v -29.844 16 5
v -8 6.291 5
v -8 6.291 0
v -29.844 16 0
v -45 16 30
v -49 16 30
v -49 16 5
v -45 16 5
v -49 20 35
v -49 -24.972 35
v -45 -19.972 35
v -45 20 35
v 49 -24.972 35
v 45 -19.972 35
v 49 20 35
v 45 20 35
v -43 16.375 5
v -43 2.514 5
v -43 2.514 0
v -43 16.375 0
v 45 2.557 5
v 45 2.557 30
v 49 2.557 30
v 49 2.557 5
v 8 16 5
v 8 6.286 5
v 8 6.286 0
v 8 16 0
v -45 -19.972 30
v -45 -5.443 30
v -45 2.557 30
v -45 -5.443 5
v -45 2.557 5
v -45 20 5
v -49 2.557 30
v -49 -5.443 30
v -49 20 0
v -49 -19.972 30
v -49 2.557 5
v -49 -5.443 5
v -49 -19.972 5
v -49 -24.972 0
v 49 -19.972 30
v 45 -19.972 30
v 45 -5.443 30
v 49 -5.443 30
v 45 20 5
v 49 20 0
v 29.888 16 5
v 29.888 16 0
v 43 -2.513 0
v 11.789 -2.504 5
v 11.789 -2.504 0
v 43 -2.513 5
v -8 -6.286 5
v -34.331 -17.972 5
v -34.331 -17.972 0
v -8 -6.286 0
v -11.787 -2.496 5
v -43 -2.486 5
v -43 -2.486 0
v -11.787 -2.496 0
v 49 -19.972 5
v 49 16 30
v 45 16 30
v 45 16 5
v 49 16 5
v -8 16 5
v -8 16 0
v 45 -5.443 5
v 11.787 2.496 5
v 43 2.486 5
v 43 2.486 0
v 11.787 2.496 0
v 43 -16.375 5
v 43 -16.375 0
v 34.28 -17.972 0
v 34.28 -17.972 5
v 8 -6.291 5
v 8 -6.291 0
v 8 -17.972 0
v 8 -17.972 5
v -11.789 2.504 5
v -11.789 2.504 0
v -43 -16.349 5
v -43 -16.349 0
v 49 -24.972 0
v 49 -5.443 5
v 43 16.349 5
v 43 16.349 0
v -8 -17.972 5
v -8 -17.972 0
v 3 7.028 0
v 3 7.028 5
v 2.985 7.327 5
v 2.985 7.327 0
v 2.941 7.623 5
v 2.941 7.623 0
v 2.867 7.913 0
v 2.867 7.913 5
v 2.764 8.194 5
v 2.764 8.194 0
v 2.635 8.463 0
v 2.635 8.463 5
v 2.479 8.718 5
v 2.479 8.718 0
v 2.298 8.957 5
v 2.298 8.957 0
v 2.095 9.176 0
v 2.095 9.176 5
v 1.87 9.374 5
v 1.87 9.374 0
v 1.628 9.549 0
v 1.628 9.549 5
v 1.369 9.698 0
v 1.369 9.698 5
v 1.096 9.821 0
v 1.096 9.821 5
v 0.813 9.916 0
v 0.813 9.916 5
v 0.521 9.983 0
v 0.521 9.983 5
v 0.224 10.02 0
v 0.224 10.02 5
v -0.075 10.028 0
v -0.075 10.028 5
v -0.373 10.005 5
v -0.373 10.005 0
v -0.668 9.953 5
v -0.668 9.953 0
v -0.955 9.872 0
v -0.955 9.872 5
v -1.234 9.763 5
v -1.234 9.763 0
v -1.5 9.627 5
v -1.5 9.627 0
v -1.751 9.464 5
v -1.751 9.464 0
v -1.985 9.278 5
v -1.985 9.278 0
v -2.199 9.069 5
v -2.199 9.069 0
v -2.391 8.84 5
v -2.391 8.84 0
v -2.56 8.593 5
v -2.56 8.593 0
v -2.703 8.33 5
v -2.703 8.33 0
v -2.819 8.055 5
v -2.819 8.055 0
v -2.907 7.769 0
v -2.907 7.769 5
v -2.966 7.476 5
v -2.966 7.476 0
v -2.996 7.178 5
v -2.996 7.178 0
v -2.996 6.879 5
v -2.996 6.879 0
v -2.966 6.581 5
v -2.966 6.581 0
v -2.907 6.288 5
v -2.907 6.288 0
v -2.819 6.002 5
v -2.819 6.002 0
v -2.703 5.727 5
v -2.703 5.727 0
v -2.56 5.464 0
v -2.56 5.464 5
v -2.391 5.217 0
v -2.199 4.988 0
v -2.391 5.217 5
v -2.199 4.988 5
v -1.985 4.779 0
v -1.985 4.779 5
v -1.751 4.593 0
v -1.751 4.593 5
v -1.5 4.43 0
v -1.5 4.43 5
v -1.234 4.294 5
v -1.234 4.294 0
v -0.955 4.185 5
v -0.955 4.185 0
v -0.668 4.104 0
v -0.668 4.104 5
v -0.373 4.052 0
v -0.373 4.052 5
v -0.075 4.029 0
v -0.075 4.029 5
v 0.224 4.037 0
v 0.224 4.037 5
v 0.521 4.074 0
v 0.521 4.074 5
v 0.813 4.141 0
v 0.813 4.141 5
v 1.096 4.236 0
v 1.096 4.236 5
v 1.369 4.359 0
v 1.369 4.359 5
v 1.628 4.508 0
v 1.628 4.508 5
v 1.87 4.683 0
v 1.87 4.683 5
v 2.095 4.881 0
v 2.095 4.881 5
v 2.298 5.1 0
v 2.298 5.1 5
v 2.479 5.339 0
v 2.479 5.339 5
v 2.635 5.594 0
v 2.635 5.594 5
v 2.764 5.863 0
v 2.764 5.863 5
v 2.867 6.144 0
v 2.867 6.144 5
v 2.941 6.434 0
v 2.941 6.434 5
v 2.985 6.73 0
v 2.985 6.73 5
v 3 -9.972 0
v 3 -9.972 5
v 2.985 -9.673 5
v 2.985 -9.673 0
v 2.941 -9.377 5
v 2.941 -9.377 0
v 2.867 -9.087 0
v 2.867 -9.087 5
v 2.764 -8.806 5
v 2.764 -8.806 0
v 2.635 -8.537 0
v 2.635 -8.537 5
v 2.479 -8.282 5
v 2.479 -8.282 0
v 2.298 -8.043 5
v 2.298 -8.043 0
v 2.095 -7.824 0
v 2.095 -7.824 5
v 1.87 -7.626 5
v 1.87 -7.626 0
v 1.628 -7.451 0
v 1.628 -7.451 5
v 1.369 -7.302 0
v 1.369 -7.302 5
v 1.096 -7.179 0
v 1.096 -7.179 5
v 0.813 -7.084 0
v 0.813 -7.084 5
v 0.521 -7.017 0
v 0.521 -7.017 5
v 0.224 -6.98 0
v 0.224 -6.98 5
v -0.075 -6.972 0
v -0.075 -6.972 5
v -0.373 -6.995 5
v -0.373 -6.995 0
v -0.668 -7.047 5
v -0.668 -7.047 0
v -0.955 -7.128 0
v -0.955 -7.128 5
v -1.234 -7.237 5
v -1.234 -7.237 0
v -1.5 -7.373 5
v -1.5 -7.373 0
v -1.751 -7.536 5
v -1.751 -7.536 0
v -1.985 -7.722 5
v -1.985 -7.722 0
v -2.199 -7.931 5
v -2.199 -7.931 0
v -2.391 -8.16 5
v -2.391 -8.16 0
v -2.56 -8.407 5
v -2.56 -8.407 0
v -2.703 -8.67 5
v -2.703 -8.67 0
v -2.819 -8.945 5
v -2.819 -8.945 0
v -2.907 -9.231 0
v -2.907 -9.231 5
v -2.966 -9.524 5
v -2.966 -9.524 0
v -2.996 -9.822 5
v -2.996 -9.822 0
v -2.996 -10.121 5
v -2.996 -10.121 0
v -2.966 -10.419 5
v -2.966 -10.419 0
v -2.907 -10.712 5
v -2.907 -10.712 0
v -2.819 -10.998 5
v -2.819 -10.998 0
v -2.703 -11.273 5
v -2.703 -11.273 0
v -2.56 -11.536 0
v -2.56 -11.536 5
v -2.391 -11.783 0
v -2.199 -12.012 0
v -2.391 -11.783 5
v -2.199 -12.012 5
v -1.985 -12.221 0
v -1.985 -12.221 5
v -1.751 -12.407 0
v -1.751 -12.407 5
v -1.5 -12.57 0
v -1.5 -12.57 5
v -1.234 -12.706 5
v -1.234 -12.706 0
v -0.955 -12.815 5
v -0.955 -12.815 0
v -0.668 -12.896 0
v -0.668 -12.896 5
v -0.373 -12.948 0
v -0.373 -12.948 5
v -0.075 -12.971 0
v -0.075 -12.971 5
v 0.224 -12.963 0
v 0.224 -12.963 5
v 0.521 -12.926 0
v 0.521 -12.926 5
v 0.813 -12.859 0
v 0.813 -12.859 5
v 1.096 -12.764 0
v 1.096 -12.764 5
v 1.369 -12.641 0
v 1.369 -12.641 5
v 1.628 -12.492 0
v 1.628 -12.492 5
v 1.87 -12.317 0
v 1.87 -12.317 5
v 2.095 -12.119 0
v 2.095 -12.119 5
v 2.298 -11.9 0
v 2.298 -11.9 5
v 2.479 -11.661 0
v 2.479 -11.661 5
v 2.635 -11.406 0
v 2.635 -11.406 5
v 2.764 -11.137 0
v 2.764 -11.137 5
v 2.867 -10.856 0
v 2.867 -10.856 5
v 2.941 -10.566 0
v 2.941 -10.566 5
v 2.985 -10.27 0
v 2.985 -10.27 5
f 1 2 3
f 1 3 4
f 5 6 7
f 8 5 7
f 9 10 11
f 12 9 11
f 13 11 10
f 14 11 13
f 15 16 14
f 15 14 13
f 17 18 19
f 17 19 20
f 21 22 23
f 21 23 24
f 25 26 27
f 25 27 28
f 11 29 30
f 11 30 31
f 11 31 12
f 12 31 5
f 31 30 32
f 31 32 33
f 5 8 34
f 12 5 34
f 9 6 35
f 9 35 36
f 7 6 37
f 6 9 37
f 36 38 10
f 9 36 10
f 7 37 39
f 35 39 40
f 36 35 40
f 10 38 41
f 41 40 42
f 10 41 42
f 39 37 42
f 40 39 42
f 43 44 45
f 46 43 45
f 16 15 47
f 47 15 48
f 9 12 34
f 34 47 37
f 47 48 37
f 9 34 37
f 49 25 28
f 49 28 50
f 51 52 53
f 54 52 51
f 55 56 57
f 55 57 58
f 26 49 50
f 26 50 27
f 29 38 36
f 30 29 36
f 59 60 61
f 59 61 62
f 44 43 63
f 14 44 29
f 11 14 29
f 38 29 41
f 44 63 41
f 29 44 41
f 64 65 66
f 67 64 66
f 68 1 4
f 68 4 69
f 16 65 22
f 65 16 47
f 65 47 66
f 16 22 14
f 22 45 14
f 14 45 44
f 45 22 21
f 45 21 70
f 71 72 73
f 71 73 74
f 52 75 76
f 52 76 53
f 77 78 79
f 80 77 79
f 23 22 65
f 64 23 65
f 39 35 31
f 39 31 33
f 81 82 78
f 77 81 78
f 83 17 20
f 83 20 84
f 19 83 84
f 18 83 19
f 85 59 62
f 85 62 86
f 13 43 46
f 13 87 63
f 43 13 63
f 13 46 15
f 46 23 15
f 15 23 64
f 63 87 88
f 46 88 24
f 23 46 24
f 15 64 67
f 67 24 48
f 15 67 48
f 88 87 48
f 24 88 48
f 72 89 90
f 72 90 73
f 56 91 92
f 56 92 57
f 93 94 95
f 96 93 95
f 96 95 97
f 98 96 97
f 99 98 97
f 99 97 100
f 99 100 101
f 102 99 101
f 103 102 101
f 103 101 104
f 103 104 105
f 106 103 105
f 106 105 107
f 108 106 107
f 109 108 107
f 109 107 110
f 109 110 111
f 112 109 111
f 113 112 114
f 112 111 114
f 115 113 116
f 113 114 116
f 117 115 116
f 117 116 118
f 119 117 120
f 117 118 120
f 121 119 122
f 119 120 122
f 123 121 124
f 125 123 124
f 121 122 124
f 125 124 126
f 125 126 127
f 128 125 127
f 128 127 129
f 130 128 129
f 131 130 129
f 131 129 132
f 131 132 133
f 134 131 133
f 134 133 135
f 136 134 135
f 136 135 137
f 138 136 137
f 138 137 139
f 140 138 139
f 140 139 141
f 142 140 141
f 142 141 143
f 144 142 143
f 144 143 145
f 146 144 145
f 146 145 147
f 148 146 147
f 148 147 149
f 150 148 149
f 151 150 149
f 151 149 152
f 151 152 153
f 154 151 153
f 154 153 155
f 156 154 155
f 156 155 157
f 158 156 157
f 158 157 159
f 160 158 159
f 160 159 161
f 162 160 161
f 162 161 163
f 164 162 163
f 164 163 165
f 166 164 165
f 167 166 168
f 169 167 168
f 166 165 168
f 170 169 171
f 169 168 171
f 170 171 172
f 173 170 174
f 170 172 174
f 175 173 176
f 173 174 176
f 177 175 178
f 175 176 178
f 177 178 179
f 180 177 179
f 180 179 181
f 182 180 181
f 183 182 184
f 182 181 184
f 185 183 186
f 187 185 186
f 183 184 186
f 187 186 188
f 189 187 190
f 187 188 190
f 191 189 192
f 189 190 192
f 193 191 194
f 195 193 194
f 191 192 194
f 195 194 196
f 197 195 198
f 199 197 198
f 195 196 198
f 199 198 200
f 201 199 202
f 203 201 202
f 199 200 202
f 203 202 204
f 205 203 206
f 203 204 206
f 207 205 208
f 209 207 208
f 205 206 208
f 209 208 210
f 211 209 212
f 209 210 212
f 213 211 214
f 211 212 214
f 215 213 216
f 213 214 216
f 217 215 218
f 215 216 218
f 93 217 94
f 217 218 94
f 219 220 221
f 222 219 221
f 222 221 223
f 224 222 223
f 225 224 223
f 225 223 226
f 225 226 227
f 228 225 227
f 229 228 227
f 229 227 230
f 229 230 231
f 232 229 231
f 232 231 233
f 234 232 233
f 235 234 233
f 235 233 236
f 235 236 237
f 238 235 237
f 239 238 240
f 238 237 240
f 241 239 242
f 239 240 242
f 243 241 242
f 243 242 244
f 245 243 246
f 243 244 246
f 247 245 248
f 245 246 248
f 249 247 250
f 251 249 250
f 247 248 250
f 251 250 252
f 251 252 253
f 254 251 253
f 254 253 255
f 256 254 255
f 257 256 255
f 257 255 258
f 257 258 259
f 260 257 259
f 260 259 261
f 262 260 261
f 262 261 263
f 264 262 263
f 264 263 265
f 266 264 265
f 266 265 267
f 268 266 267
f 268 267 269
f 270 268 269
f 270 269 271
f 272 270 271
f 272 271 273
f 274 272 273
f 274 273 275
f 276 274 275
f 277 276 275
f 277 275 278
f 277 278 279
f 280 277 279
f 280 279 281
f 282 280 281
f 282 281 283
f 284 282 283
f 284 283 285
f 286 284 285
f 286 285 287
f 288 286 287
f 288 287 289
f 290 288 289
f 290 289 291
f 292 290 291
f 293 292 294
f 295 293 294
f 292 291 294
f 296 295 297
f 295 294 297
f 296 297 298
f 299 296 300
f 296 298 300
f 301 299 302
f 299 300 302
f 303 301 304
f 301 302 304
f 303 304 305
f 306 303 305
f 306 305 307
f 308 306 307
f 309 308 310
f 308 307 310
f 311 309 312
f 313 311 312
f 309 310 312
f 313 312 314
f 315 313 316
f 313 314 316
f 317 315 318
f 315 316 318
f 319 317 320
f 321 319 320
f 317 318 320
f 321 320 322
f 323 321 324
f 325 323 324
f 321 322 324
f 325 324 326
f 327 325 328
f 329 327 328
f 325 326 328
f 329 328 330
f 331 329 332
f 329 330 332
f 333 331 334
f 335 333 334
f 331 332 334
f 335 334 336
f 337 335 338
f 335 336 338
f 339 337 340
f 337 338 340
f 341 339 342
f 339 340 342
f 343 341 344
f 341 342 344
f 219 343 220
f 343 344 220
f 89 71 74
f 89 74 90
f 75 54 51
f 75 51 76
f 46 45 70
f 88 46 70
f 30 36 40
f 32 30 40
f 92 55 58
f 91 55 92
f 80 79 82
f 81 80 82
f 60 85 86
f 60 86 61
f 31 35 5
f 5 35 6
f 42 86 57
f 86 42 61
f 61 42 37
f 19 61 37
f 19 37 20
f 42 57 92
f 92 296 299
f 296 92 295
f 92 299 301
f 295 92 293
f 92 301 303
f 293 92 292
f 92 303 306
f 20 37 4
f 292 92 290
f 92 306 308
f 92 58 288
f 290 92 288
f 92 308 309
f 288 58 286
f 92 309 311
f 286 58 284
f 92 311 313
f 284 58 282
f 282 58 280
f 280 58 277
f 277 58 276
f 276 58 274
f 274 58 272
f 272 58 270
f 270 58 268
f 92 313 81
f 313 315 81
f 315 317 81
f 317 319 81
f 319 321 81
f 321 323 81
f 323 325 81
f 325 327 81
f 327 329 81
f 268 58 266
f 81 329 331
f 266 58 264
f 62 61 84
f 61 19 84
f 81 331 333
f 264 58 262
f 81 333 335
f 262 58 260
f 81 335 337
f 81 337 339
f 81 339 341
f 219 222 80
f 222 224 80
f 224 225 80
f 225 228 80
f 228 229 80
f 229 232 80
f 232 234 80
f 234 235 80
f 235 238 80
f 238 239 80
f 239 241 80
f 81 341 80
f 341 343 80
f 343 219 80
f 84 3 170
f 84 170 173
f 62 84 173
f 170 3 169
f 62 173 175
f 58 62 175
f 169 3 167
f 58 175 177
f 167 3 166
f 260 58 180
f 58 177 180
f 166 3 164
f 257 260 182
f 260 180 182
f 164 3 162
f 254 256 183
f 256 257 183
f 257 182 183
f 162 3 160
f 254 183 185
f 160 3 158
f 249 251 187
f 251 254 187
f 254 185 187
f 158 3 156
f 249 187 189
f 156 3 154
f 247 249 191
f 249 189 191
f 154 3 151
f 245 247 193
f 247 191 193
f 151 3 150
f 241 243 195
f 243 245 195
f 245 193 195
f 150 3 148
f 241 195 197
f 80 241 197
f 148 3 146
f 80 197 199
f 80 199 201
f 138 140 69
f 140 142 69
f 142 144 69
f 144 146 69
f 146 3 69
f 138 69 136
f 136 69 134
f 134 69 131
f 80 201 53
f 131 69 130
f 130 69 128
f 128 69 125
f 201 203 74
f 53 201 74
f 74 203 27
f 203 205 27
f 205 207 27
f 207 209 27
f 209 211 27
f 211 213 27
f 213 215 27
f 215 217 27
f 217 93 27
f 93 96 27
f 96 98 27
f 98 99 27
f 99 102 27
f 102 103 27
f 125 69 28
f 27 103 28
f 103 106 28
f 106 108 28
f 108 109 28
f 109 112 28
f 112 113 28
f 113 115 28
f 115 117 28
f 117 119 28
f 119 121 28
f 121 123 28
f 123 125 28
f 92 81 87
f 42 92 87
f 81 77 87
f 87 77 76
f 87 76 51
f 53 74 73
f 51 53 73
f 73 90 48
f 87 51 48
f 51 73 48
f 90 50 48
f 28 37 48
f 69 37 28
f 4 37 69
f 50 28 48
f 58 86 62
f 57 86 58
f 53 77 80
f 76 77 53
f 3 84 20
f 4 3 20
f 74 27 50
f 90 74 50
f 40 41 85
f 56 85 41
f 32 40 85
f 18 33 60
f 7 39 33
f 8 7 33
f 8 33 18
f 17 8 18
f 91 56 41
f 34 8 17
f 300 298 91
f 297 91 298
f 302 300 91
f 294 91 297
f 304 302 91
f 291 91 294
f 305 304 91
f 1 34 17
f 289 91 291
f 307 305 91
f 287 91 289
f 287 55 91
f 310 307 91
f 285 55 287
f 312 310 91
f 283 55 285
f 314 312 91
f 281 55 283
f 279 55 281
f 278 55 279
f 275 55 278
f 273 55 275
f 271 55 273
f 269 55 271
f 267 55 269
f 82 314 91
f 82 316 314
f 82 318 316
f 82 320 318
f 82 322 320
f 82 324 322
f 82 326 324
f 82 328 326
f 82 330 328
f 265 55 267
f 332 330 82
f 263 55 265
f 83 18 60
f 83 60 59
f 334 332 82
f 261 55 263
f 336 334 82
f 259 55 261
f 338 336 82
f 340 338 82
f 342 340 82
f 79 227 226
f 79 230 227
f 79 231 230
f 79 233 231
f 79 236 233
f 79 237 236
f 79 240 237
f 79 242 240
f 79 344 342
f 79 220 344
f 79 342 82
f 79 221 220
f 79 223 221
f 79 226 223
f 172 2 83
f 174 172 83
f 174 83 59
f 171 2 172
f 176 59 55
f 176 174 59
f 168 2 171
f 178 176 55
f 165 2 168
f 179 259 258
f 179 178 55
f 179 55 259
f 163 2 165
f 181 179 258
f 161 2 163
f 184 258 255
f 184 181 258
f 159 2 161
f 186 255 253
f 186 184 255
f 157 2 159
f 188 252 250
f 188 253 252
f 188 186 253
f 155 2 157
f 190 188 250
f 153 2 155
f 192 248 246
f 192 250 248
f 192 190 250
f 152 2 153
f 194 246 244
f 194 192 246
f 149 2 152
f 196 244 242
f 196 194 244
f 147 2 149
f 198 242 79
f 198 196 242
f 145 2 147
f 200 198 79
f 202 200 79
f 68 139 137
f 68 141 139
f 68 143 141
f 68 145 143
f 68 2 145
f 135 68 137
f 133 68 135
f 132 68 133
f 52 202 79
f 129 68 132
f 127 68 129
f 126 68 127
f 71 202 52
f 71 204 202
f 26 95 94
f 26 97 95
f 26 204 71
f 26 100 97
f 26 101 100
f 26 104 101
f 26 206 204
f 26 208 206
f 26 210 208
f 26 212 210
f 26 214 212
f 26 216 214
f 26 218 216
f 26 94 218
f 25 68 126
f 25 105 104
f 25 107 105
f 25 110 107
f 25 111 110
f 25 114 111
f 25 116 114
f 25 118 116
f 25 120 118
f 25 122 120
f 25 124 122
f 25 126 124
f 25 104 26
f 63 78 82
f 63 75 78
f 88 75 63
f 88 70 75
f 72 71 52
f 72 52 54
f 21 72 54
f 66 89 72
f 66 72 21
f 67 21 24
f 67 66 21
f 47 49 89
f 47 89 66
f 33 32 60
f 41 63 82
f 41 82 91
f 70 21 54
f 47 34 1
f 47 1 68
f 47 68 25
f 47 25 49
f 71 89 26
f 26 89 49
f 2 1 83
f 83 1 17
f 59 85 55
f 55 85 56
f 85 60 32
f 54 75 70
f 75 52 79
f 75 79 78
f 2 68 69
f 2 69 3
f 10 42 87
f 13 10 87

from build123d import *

# Parameters (mm, degrees)
SKETCH1_W               = 90
SKETCH1_H               = 40
BOSS_EXTRUDE1_DEPTH     = 5
BOSS_EXTRUDE2_DEPTH     = 35
SKETCH3_R               = 3
CUT_EXTRUDE1_DEPTH      = 63.646443504
CUT_EXTRUDE2_DEPTH      = 35
CUT_EXTRUDE3_DEPTH      = 108.016713105
CUT_EXTRUDE3_DEPTH_BACK = 108.016713105
SKETCH5_W               = 25
SKETCH5_H               = 13.442792372
SKETCH5_H_2             = 14.528729082


with BuildPart() as part:
    # Sketch1 → Boss-Extrude1 (new body)
    with BuildSketch(Plane.XY):
        Rectangle(SKETCH1_W, SKETCH1_H)
    extrude(amount=BOSS_EXTRUDE1_DEPTH)

    # Sketch2 → Boss-Extrude2 (add)
    with BuildSketch(Plane.XY):
        Polygon((-45, 20), (-49, 20), (-49, -19.971521454), (-49, -24.971521454), (49, -24.971521454), (49, -19.971521454), (49, 20), (45, 20), (45, -19.971521454), (-45, -19.971521454), align=None)
    extrude(amount=BOSS_EXTRUDE2_DEPTH)

    # Sketch3 → Cut-Extrude1 (cut, through all)
    with BuildSketch(Plane.XY.offset(5)):
        with Locations((0, 7.028478546)):
            Circle(SKETCH3_R)
        with Locations((0, -9.971521454)):
            Circle(SKETCH3_R)
    extrude(amount=-CUT_EXTRUDE1_DEPTH, mode=Mode.SUBTRACT)

    # Sketch4 → Cut-Extrude2 (cut)
    with BuildSketch(Plane.XY.offset(5)):
        Polygon((-29.844463874, 16), (-8, 16), (-8, 6.291349389), align=None)
        Polygon((-43, 16.375317277), (-11.788929697, 2.503730476), (-43, 2.513606541), align=None)
        Polygon((-43, -2.486393709), (-11.787483748, -2.496270232), (-43, -16.348746631), align=None)
        Polygon((-8, -6.28564435), (-8, -17.971521454), (-34.330716509, -17.971521454), align=None)
        Polygon((8, -6.291349389), (8, -17.971521454), (34.280387146, -17.971521454), align=None)
        Polygon((43, -2.512973685), (43, -16.375317277), (11.788929697, -2.503730476), align=None)
        Polygon((11.787483748, 2.496270232), (43, 16.348746631), (43, 2.486393709), align=None)
        Polygon((8, 16), (29.888467798, 16), (8, 6.28564435), align=None)
    extrude(amount=-CUT_EXTRUDE2_DEPTH, mode=Mode.SUBTRACT)

    # Sketch5 → Cut-Extrude3 (cut, two sides: drawn at the far end of the back side and taken through both)
    with BuildSketch(Plane(origin=(49, 0, 0), x_dir=(0, 0, -1), z_dir=(1, 0, 0)).offset(-CUT_EXTRUDE3_DEPTH_BACK)):
        with Locations((-17.5, 9.278603814)):
            Rectangle(SKETCH5_W, SKETCH5_H)
        with Locations((-17.5, -12.707156913)):
            Rectangle(SKETCH5_W, SKETCH5_H_2)
    extrude(amount=CUT_EXTRUDE3_DEPTH + CUT_EXTRUDE3_DEPTH_BACK, mode=Mode.SUBTRACT)


solid = part.part
